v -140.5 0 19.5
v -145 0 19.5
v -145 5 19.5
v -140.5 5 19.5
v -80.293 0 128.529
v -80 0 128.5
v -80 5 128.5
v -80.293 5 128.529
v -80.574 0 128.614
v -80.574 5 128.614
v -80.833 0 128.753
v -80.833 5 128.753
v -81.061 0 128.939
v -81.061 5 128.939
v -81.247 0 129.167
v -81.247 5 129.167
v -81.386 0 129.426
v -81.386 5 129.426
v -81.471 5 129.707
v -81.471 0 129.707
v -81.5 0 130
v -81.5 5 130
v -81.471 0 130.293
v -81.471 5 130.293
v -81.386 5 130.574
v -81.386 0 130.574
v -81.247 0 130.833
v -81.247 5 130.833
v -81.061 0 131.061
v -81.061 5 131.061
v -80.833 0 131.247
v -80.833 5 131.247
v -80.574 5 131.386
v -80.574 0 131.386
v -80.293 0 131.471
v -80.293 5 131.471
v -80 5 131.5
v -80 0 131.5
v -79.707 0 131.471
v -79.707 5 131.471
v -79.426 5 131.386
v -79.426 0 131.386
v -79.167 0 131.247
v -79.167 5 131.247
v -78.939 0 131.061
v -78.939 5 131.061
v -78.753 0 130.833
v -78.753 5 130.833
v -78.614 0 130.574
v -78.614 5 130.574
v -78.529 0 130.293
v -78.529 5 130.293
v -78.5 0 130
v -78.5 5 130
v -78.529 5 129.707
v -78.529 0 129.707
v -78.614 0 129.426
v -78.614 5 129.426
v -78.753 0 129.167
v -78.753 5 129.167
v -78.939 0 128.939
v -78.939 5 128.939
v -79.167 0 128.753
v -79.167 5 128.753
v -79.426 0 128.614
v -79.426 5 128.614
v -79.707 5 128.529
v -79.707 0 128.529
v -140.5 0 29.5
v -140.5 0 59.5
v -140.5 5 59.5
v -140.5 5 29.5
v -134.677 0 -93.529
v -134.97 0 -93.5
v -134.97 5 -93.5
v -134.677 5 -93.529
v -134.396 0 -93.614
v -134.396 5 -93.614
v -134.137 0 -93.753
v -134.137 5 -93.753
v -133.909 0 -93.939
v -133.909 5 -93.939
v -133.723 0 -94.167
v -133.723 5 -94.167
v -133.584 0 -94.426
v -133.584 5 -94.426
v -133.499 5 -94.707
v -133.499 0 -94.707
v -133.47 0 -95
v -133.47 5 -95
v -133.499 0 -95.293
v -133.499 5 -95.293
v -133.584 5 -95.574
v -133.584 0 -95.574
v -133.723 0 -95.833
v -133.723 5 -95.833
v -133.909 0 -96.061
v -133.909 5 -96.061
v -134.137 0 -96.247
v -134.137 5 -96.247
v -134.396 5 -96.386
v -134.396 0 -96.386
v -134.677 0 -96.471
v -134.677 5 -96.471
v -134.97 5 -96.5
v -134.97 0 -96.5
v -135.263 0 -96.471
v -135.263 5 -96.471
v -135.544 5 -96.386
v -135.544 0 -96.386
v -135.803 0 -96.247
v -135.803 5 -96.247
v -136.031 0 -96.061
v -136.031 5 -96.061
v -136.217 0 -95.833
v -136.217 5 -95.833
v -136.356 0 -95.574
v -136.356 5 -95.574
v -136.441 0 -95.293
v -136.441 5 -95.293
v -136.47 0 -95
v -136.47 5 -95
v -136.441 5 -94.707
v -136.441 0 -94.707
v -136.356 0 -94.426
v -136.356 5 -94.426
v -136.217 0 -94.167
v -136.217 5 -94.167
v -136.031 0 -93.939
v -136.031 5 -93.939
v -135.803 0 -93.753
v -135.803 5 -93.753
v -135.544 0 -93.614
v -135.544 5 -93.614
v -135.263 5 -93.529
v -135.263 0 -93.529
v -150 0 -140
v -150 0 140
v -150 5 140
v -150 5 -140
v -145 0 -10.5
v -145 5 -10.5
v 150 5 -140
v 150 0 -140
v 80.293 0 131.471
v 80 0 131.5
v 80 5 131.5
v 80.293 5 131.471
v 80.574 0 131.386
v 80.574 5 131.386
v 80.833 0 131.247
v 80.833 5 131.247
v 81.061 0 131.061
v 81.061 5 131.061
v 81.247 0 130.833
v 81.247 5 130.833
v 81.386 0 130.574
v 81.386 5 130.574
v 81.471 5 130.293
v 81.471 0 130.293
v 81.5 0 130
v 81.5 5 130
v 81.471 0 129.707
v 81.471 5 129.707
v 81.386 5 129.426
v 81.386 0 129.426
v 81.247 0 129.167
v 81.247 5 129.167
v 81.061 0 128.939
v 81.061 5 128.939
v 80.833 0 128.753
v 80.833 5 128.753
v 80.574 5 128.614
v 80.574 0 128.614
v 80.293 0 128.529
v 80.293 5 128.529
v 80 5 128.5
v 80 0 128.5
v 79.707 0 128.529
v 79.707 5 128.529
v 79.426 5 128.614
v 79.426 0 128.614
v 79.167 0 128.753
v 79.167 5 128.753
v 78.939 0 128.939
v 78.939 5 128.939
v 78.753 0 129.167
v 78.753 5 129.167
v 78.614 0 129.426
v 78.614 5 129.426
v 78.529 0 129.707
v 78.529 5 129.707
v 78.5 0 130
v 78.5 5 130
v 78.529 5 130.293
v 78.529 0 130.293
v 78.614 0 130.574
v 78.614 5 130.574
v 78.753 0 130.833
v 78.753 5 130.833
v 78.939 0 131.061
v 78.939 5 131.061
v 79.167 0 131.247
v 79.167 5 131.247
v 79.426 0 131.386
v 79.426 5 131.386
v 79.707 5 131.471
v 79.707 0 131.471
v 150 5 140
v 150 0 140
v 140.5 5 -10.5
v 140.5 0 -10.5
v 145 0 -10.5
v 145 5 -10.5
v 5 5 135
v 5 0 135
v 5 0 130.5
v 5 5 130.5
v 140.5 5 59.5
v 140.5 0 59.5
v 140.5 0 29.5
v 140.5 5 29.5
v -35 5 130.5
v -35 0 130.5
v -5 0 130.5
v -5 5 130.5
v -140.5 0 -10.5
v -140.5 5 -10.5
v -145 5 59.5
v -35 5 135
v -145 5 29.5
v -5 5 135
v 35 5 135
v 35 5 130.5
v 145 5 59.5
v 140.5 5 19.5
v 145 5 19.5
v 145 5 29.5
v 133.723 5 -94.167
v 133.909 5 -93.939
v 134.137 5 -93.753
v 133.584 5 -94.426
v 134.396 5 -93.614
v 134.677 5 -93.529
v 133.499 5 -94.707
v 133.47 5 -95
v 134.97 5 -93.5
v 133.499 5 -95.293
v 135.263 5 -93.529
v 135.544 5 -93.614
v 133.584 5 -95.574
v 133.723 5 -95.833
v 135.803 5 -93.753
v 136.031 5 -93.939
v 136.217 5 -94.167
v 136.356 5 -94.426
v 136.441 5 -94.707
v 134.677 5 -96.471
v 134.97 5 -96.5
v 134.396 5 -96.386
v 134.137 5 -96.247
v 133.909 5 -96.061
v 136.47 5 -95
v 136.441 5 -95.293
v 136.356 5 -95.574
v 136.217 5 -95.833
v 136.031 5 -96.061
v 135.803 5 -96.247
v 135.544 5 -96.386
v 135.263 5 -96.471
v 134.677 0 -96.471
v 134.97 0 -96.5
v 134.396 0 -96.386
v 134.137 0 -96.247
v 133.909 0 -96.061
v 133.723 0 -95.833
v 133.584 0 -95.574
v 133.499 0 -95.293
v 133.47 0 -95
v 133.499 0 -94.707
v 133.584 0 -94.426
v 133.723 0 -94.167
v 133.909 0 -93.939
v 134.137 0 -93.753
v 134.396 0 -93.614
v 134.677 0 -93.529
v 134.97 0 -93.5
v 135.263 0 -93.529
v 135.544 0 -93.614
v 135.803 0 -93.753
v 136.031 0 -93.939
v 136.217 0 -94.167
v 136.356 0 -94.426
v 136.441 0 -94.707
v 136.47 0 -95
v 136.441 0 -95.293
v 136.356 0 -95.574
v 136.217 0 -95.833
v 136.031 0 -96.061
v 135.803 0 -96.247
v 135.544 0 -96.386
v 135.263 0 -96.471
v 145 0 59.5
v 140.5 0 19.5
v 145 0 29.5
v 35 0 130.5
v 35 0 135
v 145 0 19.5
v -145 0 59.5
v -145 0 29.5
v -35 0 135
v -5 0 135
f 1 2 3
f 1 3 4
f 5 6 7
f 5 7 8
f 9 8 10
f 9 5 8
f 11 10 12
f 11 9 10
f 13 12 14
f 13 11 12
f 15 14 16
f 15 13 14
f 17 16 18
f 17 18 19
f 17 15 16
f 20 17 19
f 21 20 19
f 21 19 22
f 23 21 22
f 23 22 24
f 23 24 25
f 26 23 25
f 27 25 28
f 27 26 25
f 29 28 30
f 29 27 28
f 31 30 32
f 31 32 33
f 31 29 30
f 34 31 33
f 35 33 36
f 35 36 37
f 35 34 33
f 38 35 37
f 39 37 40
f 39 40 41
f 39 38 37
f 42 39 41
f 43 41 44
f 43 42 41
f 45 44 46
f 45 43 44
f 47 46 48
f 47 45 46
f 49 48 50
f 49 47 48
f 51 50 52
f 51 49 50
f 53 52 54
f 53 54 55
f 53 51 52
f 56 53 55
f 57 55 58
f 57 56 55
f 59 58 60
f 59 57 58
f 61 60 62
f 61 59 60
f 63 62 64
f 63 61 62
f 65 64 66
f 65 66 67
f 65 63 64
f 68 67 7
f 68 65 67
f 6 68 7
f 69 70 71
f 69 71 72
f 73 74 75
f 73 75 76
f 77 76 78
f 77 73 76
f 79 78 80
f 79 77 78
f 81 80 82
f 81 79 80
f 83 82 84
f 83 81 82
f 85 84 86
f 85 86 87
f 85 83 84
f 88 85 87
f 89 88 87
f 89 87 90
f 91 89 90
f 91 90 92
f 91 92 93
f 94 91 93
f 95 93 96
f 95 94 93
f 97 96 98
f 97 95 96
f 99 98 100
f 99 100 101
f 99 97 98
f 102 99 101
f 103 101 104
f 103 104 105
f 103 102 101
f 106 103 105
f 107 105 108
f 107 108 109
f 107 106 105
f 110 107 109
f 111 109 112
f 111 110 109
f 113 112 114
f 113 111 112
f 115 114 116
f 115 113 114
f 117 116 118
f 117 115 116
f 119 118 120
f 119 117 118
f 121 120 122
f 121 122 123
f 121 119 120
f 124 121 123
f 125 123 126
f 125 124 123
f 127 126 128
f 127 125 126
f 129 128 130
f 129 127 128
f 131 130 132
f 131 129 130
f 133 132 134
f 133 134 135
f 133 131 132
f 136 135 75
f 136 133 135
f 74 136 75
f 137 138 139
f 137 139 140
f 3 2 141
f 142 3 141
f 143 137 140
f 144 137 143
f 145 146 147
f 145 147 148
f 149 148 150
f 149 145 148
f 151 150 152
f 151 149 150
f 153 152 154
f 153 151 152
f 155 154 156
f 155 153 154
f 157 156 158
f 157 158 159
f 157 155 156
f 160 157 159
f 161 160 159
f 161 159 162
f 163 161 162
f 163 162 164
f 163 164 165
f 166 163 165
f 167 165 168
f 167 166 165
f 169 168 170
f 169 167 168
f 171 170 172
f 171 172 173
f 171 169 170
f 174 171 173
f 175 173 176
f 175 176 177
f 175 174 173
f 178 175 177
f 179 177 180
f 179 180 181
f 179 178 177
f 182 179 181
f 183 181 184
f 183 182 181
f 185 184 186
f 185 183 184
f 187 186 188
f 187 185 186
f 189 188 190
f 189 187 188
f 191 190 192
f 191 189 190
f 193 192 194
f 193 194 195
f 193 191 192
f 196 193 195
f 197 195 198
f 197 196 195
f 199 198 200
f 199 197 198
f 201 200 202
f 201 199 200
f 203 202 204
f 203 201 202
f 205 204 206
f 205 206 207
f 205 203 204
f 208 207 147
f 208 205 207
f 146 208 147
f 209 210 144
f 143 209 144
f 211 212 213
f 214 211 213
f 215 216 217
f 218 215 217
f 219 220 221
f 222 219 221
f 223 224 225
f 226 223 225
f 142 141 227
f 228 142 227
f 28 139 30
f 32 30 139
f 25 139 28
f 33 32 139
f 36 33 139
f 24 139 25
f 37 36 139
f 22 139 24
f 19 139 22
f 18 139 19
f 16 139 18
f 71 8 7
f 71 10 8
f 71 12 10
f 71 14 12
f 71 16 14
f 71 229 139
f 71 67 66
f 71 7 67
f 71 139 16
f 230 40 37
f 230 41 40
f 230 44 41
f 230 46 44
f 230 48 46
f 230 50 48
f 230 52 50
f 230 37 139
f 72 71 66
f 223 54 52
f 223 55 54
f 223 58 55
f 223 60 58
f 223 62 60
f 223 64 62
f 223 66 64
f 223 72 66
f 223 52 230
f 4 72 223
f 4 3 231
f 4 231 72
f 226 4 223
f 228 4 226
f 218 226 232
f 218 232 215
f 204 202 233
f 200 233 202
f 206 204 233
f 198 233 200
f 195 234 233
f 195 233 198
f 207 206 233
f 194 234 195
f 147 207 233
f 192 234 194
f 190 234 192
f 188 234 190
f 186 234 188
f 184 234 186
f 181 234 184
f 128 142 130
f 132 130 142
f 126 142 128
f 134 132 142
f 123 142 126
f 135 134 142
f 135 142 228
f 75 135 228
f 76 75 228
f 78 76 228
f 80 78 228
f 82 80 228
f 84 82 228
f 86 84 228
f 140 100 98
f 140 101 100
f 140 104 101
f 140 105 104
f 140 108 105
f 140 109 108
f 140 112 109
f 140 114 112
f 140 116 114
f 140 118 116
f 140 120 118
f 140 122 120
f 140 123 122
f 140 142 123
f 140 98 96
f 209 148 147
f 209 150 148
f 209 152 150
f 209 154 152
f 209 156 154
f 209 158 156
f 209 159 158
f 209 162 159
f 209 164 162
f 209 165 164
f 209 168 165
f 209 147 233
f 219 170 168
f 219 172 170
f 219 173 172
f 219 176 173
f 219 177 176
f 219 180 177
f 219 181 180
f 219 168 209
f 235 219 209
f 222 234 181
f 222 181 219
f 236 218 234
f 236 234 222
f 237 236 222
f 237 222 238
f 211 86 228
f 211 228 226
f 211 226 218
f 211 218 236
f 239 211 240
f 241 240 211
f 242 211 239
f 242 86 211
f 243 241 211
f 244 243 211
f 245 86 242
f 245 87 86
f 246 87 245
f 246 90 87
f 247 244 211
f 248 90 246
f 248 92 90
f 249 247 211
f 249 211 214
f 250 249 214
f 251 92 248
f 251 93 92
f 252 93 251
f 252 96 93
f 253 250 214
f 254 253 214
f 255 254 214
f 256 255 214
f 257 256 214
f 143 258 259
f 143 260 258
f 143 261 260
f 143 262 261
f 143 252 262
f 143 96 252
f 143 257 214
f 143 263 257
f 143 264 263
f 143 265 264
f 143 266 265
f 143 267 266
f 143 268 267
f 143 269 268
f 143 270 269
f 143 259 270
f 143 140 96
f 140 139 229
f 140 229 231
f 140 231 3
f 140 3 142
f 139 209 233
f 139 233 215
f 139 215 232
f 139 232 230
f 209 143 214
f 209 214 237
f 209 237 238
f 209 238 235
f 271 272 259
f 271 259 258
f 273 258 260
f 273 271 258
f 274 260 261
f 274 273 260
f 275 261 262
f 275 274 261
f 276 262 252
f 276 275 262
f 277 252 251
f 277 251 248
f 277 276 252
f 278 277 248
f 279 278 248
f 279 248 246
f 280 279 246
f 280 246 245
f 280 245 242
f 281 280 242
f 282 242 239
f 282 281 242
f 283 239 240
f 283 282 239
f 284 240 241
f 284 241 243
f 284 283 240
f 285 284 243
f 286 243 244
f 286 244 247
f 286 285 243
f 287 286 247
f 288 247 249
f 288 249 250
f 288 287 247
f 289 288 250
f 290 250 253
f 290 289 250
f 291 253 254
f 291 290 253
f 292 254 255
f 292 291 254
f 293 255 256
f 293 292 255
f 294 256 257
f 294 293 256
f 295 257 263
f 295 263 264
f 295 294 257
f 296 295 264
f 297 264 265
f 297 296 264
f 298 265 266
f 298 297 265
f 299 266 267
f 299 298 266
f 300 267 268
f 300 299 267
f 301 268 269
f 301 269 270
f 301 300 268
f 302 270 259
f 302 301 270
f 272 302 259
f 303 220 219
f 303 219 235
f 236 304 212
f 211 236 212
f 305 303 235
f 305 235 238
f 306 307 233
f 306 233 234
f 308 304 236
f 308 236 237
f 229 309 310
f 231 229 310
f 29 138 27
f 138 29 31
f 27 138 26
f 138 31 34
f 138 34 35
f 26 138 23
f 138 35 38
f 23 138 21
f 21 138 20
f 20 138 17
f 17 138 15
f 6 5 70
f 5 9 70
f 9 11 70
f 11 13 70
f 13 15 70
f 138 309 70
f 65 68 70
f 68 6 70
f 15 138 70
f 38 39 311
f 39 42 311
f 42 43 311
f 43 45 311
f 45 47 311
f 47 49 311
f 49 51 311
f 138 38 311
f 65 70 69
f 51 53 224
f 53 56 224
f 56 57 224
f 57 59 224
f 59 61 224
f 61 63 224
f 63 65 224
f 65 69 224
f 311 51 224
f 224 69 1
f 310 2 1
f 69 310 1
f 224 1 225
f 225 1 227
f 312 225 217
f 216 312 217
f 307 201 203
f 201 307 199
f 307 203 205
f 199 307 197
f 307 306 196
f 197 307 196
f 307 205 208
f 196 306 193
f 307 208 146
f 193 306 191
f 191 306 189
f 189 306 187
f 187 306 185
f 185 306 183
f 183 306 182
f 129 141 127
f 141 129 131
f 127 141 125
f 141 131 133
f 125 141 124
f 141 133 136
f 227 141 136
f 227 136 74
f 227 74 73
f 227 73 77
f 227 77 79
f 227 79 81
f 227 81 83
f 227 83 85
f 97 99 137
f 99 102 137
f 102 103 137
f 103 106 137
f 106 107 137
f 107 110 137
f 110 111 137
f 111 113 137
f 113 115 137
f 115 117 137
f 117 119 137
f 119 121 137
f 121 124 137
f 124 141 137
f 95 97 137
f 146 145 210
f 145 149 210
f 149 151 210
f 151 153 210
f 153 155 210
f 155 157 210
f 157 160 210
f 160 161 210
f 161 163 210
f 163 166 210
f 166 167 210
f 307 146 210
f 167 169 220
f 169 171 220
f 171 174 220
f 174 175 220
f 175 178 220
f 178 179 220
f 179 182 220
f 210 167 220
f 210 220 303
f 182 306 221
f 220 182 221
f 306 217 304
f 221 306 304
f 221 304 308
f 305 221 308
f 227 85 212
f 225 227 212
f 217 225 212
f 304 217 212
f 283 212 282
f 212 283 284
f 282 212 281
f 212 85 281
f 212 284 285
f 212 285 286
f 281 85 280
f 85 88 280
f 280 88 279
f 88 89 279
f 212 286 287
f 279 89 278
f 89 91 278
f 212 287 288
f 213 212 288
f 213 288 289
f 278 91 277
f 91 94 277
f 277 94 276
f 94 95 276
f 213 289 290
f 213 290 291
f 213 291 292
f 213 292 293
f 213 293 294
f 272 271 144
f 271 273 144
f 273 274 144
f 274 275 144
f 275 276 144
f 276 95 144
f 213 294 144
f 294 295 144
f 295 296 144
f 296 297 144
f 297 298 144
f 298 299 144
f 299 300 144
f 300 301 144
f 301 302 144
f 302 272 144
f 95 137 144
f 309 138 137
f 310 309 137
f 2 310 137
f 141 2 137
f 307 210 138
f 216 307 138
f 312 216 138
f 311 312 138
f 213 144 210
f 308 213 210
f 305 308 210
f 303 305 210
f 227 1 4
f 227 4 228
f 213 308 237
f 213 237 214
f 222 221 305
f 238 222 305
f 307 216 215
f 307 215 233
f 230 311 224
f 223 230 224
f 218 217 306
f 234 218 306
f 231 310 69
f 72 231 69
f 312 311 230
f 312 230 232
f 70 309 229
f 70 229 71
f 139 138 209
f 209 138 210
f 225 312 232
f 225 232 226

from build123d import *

# Parameters (mm, degrees)
SKETCH1_W           = 300
SKETCH1_H           = 280
SKETCH1_R           = 1.5
SKETCH1_W_2         = 30
SKETCH1_H_2         = 4.5
SKETCH1_W_3         = 4.5
SKETCH1_H_3         = 30
BOSS_EXTRUDE1_DEPTH = 5


with BuildPart() as part:
    # Sketch1 → Boss-Extrude1 (new body)
    with BuildSketch(Plane(origin=(0, 0, 0), x_dir=(1, 0, 0), z_dir=(0, 1, 0))):
        Rectangle(SKETCH1_W, SKETCH1_H)
        with Locations(Location((-134.97, 95, 0), (0, 0, 270))):
            Circle(SKETCH1_R, mode=Mode.SUBTRACT)
        with Locations(Location((134.97, 95, 0), (0, 0, 90))):
            Circle(SKETCH1_R, mode=Mode.SUBTRACT)
        with Locations(Location((80, -130, 0), (0, 0, 270))):
            Circle(SKETCH1_R, mode=Mode.SUBTRACT)
        with Locations(Location((-80, -130, 0), (0, 0, 90))):
            Circle(SKETCH1_R, mode=Mode.SUBTRACT)
        with Locations((-20, -132.75)):
            Rectangle(SKETCH1_W_2, SKETCH1_H_2, mode=Mode.SUBTRACT)
        with Locations((20, -132.75)):
            Rectangle(SKETCH1_W_2, SKETCH1_H_2, mode=Mode.SUBTRACT)
        with Locations((142.75, -44.5)):
            Rectangle(SKETCH1_W_3, SKETCH1_H_3, mode=Mode.SUBTRACT)
        with Locations((142.75, -4.5)):
            Rectangle(SKETCH1_W_3, SKETCH1_H_3, mode=Mode.SUBTRACT)
        with Locations((-142.75, -44.5)):
            Rectangle(SKETCH1_W_3, SKETCH1_H_3, mode=Mode.SUBTRACT)
        with Locations((-142.75, -4.5)):
            Rectangle(SKETCH1_W_3, SKETCH1_H_3, mode=Mode.SUBTRACT)
    extrude(amount=BOSS_EXTRUDE1_DEPTH)


solid = part.part
